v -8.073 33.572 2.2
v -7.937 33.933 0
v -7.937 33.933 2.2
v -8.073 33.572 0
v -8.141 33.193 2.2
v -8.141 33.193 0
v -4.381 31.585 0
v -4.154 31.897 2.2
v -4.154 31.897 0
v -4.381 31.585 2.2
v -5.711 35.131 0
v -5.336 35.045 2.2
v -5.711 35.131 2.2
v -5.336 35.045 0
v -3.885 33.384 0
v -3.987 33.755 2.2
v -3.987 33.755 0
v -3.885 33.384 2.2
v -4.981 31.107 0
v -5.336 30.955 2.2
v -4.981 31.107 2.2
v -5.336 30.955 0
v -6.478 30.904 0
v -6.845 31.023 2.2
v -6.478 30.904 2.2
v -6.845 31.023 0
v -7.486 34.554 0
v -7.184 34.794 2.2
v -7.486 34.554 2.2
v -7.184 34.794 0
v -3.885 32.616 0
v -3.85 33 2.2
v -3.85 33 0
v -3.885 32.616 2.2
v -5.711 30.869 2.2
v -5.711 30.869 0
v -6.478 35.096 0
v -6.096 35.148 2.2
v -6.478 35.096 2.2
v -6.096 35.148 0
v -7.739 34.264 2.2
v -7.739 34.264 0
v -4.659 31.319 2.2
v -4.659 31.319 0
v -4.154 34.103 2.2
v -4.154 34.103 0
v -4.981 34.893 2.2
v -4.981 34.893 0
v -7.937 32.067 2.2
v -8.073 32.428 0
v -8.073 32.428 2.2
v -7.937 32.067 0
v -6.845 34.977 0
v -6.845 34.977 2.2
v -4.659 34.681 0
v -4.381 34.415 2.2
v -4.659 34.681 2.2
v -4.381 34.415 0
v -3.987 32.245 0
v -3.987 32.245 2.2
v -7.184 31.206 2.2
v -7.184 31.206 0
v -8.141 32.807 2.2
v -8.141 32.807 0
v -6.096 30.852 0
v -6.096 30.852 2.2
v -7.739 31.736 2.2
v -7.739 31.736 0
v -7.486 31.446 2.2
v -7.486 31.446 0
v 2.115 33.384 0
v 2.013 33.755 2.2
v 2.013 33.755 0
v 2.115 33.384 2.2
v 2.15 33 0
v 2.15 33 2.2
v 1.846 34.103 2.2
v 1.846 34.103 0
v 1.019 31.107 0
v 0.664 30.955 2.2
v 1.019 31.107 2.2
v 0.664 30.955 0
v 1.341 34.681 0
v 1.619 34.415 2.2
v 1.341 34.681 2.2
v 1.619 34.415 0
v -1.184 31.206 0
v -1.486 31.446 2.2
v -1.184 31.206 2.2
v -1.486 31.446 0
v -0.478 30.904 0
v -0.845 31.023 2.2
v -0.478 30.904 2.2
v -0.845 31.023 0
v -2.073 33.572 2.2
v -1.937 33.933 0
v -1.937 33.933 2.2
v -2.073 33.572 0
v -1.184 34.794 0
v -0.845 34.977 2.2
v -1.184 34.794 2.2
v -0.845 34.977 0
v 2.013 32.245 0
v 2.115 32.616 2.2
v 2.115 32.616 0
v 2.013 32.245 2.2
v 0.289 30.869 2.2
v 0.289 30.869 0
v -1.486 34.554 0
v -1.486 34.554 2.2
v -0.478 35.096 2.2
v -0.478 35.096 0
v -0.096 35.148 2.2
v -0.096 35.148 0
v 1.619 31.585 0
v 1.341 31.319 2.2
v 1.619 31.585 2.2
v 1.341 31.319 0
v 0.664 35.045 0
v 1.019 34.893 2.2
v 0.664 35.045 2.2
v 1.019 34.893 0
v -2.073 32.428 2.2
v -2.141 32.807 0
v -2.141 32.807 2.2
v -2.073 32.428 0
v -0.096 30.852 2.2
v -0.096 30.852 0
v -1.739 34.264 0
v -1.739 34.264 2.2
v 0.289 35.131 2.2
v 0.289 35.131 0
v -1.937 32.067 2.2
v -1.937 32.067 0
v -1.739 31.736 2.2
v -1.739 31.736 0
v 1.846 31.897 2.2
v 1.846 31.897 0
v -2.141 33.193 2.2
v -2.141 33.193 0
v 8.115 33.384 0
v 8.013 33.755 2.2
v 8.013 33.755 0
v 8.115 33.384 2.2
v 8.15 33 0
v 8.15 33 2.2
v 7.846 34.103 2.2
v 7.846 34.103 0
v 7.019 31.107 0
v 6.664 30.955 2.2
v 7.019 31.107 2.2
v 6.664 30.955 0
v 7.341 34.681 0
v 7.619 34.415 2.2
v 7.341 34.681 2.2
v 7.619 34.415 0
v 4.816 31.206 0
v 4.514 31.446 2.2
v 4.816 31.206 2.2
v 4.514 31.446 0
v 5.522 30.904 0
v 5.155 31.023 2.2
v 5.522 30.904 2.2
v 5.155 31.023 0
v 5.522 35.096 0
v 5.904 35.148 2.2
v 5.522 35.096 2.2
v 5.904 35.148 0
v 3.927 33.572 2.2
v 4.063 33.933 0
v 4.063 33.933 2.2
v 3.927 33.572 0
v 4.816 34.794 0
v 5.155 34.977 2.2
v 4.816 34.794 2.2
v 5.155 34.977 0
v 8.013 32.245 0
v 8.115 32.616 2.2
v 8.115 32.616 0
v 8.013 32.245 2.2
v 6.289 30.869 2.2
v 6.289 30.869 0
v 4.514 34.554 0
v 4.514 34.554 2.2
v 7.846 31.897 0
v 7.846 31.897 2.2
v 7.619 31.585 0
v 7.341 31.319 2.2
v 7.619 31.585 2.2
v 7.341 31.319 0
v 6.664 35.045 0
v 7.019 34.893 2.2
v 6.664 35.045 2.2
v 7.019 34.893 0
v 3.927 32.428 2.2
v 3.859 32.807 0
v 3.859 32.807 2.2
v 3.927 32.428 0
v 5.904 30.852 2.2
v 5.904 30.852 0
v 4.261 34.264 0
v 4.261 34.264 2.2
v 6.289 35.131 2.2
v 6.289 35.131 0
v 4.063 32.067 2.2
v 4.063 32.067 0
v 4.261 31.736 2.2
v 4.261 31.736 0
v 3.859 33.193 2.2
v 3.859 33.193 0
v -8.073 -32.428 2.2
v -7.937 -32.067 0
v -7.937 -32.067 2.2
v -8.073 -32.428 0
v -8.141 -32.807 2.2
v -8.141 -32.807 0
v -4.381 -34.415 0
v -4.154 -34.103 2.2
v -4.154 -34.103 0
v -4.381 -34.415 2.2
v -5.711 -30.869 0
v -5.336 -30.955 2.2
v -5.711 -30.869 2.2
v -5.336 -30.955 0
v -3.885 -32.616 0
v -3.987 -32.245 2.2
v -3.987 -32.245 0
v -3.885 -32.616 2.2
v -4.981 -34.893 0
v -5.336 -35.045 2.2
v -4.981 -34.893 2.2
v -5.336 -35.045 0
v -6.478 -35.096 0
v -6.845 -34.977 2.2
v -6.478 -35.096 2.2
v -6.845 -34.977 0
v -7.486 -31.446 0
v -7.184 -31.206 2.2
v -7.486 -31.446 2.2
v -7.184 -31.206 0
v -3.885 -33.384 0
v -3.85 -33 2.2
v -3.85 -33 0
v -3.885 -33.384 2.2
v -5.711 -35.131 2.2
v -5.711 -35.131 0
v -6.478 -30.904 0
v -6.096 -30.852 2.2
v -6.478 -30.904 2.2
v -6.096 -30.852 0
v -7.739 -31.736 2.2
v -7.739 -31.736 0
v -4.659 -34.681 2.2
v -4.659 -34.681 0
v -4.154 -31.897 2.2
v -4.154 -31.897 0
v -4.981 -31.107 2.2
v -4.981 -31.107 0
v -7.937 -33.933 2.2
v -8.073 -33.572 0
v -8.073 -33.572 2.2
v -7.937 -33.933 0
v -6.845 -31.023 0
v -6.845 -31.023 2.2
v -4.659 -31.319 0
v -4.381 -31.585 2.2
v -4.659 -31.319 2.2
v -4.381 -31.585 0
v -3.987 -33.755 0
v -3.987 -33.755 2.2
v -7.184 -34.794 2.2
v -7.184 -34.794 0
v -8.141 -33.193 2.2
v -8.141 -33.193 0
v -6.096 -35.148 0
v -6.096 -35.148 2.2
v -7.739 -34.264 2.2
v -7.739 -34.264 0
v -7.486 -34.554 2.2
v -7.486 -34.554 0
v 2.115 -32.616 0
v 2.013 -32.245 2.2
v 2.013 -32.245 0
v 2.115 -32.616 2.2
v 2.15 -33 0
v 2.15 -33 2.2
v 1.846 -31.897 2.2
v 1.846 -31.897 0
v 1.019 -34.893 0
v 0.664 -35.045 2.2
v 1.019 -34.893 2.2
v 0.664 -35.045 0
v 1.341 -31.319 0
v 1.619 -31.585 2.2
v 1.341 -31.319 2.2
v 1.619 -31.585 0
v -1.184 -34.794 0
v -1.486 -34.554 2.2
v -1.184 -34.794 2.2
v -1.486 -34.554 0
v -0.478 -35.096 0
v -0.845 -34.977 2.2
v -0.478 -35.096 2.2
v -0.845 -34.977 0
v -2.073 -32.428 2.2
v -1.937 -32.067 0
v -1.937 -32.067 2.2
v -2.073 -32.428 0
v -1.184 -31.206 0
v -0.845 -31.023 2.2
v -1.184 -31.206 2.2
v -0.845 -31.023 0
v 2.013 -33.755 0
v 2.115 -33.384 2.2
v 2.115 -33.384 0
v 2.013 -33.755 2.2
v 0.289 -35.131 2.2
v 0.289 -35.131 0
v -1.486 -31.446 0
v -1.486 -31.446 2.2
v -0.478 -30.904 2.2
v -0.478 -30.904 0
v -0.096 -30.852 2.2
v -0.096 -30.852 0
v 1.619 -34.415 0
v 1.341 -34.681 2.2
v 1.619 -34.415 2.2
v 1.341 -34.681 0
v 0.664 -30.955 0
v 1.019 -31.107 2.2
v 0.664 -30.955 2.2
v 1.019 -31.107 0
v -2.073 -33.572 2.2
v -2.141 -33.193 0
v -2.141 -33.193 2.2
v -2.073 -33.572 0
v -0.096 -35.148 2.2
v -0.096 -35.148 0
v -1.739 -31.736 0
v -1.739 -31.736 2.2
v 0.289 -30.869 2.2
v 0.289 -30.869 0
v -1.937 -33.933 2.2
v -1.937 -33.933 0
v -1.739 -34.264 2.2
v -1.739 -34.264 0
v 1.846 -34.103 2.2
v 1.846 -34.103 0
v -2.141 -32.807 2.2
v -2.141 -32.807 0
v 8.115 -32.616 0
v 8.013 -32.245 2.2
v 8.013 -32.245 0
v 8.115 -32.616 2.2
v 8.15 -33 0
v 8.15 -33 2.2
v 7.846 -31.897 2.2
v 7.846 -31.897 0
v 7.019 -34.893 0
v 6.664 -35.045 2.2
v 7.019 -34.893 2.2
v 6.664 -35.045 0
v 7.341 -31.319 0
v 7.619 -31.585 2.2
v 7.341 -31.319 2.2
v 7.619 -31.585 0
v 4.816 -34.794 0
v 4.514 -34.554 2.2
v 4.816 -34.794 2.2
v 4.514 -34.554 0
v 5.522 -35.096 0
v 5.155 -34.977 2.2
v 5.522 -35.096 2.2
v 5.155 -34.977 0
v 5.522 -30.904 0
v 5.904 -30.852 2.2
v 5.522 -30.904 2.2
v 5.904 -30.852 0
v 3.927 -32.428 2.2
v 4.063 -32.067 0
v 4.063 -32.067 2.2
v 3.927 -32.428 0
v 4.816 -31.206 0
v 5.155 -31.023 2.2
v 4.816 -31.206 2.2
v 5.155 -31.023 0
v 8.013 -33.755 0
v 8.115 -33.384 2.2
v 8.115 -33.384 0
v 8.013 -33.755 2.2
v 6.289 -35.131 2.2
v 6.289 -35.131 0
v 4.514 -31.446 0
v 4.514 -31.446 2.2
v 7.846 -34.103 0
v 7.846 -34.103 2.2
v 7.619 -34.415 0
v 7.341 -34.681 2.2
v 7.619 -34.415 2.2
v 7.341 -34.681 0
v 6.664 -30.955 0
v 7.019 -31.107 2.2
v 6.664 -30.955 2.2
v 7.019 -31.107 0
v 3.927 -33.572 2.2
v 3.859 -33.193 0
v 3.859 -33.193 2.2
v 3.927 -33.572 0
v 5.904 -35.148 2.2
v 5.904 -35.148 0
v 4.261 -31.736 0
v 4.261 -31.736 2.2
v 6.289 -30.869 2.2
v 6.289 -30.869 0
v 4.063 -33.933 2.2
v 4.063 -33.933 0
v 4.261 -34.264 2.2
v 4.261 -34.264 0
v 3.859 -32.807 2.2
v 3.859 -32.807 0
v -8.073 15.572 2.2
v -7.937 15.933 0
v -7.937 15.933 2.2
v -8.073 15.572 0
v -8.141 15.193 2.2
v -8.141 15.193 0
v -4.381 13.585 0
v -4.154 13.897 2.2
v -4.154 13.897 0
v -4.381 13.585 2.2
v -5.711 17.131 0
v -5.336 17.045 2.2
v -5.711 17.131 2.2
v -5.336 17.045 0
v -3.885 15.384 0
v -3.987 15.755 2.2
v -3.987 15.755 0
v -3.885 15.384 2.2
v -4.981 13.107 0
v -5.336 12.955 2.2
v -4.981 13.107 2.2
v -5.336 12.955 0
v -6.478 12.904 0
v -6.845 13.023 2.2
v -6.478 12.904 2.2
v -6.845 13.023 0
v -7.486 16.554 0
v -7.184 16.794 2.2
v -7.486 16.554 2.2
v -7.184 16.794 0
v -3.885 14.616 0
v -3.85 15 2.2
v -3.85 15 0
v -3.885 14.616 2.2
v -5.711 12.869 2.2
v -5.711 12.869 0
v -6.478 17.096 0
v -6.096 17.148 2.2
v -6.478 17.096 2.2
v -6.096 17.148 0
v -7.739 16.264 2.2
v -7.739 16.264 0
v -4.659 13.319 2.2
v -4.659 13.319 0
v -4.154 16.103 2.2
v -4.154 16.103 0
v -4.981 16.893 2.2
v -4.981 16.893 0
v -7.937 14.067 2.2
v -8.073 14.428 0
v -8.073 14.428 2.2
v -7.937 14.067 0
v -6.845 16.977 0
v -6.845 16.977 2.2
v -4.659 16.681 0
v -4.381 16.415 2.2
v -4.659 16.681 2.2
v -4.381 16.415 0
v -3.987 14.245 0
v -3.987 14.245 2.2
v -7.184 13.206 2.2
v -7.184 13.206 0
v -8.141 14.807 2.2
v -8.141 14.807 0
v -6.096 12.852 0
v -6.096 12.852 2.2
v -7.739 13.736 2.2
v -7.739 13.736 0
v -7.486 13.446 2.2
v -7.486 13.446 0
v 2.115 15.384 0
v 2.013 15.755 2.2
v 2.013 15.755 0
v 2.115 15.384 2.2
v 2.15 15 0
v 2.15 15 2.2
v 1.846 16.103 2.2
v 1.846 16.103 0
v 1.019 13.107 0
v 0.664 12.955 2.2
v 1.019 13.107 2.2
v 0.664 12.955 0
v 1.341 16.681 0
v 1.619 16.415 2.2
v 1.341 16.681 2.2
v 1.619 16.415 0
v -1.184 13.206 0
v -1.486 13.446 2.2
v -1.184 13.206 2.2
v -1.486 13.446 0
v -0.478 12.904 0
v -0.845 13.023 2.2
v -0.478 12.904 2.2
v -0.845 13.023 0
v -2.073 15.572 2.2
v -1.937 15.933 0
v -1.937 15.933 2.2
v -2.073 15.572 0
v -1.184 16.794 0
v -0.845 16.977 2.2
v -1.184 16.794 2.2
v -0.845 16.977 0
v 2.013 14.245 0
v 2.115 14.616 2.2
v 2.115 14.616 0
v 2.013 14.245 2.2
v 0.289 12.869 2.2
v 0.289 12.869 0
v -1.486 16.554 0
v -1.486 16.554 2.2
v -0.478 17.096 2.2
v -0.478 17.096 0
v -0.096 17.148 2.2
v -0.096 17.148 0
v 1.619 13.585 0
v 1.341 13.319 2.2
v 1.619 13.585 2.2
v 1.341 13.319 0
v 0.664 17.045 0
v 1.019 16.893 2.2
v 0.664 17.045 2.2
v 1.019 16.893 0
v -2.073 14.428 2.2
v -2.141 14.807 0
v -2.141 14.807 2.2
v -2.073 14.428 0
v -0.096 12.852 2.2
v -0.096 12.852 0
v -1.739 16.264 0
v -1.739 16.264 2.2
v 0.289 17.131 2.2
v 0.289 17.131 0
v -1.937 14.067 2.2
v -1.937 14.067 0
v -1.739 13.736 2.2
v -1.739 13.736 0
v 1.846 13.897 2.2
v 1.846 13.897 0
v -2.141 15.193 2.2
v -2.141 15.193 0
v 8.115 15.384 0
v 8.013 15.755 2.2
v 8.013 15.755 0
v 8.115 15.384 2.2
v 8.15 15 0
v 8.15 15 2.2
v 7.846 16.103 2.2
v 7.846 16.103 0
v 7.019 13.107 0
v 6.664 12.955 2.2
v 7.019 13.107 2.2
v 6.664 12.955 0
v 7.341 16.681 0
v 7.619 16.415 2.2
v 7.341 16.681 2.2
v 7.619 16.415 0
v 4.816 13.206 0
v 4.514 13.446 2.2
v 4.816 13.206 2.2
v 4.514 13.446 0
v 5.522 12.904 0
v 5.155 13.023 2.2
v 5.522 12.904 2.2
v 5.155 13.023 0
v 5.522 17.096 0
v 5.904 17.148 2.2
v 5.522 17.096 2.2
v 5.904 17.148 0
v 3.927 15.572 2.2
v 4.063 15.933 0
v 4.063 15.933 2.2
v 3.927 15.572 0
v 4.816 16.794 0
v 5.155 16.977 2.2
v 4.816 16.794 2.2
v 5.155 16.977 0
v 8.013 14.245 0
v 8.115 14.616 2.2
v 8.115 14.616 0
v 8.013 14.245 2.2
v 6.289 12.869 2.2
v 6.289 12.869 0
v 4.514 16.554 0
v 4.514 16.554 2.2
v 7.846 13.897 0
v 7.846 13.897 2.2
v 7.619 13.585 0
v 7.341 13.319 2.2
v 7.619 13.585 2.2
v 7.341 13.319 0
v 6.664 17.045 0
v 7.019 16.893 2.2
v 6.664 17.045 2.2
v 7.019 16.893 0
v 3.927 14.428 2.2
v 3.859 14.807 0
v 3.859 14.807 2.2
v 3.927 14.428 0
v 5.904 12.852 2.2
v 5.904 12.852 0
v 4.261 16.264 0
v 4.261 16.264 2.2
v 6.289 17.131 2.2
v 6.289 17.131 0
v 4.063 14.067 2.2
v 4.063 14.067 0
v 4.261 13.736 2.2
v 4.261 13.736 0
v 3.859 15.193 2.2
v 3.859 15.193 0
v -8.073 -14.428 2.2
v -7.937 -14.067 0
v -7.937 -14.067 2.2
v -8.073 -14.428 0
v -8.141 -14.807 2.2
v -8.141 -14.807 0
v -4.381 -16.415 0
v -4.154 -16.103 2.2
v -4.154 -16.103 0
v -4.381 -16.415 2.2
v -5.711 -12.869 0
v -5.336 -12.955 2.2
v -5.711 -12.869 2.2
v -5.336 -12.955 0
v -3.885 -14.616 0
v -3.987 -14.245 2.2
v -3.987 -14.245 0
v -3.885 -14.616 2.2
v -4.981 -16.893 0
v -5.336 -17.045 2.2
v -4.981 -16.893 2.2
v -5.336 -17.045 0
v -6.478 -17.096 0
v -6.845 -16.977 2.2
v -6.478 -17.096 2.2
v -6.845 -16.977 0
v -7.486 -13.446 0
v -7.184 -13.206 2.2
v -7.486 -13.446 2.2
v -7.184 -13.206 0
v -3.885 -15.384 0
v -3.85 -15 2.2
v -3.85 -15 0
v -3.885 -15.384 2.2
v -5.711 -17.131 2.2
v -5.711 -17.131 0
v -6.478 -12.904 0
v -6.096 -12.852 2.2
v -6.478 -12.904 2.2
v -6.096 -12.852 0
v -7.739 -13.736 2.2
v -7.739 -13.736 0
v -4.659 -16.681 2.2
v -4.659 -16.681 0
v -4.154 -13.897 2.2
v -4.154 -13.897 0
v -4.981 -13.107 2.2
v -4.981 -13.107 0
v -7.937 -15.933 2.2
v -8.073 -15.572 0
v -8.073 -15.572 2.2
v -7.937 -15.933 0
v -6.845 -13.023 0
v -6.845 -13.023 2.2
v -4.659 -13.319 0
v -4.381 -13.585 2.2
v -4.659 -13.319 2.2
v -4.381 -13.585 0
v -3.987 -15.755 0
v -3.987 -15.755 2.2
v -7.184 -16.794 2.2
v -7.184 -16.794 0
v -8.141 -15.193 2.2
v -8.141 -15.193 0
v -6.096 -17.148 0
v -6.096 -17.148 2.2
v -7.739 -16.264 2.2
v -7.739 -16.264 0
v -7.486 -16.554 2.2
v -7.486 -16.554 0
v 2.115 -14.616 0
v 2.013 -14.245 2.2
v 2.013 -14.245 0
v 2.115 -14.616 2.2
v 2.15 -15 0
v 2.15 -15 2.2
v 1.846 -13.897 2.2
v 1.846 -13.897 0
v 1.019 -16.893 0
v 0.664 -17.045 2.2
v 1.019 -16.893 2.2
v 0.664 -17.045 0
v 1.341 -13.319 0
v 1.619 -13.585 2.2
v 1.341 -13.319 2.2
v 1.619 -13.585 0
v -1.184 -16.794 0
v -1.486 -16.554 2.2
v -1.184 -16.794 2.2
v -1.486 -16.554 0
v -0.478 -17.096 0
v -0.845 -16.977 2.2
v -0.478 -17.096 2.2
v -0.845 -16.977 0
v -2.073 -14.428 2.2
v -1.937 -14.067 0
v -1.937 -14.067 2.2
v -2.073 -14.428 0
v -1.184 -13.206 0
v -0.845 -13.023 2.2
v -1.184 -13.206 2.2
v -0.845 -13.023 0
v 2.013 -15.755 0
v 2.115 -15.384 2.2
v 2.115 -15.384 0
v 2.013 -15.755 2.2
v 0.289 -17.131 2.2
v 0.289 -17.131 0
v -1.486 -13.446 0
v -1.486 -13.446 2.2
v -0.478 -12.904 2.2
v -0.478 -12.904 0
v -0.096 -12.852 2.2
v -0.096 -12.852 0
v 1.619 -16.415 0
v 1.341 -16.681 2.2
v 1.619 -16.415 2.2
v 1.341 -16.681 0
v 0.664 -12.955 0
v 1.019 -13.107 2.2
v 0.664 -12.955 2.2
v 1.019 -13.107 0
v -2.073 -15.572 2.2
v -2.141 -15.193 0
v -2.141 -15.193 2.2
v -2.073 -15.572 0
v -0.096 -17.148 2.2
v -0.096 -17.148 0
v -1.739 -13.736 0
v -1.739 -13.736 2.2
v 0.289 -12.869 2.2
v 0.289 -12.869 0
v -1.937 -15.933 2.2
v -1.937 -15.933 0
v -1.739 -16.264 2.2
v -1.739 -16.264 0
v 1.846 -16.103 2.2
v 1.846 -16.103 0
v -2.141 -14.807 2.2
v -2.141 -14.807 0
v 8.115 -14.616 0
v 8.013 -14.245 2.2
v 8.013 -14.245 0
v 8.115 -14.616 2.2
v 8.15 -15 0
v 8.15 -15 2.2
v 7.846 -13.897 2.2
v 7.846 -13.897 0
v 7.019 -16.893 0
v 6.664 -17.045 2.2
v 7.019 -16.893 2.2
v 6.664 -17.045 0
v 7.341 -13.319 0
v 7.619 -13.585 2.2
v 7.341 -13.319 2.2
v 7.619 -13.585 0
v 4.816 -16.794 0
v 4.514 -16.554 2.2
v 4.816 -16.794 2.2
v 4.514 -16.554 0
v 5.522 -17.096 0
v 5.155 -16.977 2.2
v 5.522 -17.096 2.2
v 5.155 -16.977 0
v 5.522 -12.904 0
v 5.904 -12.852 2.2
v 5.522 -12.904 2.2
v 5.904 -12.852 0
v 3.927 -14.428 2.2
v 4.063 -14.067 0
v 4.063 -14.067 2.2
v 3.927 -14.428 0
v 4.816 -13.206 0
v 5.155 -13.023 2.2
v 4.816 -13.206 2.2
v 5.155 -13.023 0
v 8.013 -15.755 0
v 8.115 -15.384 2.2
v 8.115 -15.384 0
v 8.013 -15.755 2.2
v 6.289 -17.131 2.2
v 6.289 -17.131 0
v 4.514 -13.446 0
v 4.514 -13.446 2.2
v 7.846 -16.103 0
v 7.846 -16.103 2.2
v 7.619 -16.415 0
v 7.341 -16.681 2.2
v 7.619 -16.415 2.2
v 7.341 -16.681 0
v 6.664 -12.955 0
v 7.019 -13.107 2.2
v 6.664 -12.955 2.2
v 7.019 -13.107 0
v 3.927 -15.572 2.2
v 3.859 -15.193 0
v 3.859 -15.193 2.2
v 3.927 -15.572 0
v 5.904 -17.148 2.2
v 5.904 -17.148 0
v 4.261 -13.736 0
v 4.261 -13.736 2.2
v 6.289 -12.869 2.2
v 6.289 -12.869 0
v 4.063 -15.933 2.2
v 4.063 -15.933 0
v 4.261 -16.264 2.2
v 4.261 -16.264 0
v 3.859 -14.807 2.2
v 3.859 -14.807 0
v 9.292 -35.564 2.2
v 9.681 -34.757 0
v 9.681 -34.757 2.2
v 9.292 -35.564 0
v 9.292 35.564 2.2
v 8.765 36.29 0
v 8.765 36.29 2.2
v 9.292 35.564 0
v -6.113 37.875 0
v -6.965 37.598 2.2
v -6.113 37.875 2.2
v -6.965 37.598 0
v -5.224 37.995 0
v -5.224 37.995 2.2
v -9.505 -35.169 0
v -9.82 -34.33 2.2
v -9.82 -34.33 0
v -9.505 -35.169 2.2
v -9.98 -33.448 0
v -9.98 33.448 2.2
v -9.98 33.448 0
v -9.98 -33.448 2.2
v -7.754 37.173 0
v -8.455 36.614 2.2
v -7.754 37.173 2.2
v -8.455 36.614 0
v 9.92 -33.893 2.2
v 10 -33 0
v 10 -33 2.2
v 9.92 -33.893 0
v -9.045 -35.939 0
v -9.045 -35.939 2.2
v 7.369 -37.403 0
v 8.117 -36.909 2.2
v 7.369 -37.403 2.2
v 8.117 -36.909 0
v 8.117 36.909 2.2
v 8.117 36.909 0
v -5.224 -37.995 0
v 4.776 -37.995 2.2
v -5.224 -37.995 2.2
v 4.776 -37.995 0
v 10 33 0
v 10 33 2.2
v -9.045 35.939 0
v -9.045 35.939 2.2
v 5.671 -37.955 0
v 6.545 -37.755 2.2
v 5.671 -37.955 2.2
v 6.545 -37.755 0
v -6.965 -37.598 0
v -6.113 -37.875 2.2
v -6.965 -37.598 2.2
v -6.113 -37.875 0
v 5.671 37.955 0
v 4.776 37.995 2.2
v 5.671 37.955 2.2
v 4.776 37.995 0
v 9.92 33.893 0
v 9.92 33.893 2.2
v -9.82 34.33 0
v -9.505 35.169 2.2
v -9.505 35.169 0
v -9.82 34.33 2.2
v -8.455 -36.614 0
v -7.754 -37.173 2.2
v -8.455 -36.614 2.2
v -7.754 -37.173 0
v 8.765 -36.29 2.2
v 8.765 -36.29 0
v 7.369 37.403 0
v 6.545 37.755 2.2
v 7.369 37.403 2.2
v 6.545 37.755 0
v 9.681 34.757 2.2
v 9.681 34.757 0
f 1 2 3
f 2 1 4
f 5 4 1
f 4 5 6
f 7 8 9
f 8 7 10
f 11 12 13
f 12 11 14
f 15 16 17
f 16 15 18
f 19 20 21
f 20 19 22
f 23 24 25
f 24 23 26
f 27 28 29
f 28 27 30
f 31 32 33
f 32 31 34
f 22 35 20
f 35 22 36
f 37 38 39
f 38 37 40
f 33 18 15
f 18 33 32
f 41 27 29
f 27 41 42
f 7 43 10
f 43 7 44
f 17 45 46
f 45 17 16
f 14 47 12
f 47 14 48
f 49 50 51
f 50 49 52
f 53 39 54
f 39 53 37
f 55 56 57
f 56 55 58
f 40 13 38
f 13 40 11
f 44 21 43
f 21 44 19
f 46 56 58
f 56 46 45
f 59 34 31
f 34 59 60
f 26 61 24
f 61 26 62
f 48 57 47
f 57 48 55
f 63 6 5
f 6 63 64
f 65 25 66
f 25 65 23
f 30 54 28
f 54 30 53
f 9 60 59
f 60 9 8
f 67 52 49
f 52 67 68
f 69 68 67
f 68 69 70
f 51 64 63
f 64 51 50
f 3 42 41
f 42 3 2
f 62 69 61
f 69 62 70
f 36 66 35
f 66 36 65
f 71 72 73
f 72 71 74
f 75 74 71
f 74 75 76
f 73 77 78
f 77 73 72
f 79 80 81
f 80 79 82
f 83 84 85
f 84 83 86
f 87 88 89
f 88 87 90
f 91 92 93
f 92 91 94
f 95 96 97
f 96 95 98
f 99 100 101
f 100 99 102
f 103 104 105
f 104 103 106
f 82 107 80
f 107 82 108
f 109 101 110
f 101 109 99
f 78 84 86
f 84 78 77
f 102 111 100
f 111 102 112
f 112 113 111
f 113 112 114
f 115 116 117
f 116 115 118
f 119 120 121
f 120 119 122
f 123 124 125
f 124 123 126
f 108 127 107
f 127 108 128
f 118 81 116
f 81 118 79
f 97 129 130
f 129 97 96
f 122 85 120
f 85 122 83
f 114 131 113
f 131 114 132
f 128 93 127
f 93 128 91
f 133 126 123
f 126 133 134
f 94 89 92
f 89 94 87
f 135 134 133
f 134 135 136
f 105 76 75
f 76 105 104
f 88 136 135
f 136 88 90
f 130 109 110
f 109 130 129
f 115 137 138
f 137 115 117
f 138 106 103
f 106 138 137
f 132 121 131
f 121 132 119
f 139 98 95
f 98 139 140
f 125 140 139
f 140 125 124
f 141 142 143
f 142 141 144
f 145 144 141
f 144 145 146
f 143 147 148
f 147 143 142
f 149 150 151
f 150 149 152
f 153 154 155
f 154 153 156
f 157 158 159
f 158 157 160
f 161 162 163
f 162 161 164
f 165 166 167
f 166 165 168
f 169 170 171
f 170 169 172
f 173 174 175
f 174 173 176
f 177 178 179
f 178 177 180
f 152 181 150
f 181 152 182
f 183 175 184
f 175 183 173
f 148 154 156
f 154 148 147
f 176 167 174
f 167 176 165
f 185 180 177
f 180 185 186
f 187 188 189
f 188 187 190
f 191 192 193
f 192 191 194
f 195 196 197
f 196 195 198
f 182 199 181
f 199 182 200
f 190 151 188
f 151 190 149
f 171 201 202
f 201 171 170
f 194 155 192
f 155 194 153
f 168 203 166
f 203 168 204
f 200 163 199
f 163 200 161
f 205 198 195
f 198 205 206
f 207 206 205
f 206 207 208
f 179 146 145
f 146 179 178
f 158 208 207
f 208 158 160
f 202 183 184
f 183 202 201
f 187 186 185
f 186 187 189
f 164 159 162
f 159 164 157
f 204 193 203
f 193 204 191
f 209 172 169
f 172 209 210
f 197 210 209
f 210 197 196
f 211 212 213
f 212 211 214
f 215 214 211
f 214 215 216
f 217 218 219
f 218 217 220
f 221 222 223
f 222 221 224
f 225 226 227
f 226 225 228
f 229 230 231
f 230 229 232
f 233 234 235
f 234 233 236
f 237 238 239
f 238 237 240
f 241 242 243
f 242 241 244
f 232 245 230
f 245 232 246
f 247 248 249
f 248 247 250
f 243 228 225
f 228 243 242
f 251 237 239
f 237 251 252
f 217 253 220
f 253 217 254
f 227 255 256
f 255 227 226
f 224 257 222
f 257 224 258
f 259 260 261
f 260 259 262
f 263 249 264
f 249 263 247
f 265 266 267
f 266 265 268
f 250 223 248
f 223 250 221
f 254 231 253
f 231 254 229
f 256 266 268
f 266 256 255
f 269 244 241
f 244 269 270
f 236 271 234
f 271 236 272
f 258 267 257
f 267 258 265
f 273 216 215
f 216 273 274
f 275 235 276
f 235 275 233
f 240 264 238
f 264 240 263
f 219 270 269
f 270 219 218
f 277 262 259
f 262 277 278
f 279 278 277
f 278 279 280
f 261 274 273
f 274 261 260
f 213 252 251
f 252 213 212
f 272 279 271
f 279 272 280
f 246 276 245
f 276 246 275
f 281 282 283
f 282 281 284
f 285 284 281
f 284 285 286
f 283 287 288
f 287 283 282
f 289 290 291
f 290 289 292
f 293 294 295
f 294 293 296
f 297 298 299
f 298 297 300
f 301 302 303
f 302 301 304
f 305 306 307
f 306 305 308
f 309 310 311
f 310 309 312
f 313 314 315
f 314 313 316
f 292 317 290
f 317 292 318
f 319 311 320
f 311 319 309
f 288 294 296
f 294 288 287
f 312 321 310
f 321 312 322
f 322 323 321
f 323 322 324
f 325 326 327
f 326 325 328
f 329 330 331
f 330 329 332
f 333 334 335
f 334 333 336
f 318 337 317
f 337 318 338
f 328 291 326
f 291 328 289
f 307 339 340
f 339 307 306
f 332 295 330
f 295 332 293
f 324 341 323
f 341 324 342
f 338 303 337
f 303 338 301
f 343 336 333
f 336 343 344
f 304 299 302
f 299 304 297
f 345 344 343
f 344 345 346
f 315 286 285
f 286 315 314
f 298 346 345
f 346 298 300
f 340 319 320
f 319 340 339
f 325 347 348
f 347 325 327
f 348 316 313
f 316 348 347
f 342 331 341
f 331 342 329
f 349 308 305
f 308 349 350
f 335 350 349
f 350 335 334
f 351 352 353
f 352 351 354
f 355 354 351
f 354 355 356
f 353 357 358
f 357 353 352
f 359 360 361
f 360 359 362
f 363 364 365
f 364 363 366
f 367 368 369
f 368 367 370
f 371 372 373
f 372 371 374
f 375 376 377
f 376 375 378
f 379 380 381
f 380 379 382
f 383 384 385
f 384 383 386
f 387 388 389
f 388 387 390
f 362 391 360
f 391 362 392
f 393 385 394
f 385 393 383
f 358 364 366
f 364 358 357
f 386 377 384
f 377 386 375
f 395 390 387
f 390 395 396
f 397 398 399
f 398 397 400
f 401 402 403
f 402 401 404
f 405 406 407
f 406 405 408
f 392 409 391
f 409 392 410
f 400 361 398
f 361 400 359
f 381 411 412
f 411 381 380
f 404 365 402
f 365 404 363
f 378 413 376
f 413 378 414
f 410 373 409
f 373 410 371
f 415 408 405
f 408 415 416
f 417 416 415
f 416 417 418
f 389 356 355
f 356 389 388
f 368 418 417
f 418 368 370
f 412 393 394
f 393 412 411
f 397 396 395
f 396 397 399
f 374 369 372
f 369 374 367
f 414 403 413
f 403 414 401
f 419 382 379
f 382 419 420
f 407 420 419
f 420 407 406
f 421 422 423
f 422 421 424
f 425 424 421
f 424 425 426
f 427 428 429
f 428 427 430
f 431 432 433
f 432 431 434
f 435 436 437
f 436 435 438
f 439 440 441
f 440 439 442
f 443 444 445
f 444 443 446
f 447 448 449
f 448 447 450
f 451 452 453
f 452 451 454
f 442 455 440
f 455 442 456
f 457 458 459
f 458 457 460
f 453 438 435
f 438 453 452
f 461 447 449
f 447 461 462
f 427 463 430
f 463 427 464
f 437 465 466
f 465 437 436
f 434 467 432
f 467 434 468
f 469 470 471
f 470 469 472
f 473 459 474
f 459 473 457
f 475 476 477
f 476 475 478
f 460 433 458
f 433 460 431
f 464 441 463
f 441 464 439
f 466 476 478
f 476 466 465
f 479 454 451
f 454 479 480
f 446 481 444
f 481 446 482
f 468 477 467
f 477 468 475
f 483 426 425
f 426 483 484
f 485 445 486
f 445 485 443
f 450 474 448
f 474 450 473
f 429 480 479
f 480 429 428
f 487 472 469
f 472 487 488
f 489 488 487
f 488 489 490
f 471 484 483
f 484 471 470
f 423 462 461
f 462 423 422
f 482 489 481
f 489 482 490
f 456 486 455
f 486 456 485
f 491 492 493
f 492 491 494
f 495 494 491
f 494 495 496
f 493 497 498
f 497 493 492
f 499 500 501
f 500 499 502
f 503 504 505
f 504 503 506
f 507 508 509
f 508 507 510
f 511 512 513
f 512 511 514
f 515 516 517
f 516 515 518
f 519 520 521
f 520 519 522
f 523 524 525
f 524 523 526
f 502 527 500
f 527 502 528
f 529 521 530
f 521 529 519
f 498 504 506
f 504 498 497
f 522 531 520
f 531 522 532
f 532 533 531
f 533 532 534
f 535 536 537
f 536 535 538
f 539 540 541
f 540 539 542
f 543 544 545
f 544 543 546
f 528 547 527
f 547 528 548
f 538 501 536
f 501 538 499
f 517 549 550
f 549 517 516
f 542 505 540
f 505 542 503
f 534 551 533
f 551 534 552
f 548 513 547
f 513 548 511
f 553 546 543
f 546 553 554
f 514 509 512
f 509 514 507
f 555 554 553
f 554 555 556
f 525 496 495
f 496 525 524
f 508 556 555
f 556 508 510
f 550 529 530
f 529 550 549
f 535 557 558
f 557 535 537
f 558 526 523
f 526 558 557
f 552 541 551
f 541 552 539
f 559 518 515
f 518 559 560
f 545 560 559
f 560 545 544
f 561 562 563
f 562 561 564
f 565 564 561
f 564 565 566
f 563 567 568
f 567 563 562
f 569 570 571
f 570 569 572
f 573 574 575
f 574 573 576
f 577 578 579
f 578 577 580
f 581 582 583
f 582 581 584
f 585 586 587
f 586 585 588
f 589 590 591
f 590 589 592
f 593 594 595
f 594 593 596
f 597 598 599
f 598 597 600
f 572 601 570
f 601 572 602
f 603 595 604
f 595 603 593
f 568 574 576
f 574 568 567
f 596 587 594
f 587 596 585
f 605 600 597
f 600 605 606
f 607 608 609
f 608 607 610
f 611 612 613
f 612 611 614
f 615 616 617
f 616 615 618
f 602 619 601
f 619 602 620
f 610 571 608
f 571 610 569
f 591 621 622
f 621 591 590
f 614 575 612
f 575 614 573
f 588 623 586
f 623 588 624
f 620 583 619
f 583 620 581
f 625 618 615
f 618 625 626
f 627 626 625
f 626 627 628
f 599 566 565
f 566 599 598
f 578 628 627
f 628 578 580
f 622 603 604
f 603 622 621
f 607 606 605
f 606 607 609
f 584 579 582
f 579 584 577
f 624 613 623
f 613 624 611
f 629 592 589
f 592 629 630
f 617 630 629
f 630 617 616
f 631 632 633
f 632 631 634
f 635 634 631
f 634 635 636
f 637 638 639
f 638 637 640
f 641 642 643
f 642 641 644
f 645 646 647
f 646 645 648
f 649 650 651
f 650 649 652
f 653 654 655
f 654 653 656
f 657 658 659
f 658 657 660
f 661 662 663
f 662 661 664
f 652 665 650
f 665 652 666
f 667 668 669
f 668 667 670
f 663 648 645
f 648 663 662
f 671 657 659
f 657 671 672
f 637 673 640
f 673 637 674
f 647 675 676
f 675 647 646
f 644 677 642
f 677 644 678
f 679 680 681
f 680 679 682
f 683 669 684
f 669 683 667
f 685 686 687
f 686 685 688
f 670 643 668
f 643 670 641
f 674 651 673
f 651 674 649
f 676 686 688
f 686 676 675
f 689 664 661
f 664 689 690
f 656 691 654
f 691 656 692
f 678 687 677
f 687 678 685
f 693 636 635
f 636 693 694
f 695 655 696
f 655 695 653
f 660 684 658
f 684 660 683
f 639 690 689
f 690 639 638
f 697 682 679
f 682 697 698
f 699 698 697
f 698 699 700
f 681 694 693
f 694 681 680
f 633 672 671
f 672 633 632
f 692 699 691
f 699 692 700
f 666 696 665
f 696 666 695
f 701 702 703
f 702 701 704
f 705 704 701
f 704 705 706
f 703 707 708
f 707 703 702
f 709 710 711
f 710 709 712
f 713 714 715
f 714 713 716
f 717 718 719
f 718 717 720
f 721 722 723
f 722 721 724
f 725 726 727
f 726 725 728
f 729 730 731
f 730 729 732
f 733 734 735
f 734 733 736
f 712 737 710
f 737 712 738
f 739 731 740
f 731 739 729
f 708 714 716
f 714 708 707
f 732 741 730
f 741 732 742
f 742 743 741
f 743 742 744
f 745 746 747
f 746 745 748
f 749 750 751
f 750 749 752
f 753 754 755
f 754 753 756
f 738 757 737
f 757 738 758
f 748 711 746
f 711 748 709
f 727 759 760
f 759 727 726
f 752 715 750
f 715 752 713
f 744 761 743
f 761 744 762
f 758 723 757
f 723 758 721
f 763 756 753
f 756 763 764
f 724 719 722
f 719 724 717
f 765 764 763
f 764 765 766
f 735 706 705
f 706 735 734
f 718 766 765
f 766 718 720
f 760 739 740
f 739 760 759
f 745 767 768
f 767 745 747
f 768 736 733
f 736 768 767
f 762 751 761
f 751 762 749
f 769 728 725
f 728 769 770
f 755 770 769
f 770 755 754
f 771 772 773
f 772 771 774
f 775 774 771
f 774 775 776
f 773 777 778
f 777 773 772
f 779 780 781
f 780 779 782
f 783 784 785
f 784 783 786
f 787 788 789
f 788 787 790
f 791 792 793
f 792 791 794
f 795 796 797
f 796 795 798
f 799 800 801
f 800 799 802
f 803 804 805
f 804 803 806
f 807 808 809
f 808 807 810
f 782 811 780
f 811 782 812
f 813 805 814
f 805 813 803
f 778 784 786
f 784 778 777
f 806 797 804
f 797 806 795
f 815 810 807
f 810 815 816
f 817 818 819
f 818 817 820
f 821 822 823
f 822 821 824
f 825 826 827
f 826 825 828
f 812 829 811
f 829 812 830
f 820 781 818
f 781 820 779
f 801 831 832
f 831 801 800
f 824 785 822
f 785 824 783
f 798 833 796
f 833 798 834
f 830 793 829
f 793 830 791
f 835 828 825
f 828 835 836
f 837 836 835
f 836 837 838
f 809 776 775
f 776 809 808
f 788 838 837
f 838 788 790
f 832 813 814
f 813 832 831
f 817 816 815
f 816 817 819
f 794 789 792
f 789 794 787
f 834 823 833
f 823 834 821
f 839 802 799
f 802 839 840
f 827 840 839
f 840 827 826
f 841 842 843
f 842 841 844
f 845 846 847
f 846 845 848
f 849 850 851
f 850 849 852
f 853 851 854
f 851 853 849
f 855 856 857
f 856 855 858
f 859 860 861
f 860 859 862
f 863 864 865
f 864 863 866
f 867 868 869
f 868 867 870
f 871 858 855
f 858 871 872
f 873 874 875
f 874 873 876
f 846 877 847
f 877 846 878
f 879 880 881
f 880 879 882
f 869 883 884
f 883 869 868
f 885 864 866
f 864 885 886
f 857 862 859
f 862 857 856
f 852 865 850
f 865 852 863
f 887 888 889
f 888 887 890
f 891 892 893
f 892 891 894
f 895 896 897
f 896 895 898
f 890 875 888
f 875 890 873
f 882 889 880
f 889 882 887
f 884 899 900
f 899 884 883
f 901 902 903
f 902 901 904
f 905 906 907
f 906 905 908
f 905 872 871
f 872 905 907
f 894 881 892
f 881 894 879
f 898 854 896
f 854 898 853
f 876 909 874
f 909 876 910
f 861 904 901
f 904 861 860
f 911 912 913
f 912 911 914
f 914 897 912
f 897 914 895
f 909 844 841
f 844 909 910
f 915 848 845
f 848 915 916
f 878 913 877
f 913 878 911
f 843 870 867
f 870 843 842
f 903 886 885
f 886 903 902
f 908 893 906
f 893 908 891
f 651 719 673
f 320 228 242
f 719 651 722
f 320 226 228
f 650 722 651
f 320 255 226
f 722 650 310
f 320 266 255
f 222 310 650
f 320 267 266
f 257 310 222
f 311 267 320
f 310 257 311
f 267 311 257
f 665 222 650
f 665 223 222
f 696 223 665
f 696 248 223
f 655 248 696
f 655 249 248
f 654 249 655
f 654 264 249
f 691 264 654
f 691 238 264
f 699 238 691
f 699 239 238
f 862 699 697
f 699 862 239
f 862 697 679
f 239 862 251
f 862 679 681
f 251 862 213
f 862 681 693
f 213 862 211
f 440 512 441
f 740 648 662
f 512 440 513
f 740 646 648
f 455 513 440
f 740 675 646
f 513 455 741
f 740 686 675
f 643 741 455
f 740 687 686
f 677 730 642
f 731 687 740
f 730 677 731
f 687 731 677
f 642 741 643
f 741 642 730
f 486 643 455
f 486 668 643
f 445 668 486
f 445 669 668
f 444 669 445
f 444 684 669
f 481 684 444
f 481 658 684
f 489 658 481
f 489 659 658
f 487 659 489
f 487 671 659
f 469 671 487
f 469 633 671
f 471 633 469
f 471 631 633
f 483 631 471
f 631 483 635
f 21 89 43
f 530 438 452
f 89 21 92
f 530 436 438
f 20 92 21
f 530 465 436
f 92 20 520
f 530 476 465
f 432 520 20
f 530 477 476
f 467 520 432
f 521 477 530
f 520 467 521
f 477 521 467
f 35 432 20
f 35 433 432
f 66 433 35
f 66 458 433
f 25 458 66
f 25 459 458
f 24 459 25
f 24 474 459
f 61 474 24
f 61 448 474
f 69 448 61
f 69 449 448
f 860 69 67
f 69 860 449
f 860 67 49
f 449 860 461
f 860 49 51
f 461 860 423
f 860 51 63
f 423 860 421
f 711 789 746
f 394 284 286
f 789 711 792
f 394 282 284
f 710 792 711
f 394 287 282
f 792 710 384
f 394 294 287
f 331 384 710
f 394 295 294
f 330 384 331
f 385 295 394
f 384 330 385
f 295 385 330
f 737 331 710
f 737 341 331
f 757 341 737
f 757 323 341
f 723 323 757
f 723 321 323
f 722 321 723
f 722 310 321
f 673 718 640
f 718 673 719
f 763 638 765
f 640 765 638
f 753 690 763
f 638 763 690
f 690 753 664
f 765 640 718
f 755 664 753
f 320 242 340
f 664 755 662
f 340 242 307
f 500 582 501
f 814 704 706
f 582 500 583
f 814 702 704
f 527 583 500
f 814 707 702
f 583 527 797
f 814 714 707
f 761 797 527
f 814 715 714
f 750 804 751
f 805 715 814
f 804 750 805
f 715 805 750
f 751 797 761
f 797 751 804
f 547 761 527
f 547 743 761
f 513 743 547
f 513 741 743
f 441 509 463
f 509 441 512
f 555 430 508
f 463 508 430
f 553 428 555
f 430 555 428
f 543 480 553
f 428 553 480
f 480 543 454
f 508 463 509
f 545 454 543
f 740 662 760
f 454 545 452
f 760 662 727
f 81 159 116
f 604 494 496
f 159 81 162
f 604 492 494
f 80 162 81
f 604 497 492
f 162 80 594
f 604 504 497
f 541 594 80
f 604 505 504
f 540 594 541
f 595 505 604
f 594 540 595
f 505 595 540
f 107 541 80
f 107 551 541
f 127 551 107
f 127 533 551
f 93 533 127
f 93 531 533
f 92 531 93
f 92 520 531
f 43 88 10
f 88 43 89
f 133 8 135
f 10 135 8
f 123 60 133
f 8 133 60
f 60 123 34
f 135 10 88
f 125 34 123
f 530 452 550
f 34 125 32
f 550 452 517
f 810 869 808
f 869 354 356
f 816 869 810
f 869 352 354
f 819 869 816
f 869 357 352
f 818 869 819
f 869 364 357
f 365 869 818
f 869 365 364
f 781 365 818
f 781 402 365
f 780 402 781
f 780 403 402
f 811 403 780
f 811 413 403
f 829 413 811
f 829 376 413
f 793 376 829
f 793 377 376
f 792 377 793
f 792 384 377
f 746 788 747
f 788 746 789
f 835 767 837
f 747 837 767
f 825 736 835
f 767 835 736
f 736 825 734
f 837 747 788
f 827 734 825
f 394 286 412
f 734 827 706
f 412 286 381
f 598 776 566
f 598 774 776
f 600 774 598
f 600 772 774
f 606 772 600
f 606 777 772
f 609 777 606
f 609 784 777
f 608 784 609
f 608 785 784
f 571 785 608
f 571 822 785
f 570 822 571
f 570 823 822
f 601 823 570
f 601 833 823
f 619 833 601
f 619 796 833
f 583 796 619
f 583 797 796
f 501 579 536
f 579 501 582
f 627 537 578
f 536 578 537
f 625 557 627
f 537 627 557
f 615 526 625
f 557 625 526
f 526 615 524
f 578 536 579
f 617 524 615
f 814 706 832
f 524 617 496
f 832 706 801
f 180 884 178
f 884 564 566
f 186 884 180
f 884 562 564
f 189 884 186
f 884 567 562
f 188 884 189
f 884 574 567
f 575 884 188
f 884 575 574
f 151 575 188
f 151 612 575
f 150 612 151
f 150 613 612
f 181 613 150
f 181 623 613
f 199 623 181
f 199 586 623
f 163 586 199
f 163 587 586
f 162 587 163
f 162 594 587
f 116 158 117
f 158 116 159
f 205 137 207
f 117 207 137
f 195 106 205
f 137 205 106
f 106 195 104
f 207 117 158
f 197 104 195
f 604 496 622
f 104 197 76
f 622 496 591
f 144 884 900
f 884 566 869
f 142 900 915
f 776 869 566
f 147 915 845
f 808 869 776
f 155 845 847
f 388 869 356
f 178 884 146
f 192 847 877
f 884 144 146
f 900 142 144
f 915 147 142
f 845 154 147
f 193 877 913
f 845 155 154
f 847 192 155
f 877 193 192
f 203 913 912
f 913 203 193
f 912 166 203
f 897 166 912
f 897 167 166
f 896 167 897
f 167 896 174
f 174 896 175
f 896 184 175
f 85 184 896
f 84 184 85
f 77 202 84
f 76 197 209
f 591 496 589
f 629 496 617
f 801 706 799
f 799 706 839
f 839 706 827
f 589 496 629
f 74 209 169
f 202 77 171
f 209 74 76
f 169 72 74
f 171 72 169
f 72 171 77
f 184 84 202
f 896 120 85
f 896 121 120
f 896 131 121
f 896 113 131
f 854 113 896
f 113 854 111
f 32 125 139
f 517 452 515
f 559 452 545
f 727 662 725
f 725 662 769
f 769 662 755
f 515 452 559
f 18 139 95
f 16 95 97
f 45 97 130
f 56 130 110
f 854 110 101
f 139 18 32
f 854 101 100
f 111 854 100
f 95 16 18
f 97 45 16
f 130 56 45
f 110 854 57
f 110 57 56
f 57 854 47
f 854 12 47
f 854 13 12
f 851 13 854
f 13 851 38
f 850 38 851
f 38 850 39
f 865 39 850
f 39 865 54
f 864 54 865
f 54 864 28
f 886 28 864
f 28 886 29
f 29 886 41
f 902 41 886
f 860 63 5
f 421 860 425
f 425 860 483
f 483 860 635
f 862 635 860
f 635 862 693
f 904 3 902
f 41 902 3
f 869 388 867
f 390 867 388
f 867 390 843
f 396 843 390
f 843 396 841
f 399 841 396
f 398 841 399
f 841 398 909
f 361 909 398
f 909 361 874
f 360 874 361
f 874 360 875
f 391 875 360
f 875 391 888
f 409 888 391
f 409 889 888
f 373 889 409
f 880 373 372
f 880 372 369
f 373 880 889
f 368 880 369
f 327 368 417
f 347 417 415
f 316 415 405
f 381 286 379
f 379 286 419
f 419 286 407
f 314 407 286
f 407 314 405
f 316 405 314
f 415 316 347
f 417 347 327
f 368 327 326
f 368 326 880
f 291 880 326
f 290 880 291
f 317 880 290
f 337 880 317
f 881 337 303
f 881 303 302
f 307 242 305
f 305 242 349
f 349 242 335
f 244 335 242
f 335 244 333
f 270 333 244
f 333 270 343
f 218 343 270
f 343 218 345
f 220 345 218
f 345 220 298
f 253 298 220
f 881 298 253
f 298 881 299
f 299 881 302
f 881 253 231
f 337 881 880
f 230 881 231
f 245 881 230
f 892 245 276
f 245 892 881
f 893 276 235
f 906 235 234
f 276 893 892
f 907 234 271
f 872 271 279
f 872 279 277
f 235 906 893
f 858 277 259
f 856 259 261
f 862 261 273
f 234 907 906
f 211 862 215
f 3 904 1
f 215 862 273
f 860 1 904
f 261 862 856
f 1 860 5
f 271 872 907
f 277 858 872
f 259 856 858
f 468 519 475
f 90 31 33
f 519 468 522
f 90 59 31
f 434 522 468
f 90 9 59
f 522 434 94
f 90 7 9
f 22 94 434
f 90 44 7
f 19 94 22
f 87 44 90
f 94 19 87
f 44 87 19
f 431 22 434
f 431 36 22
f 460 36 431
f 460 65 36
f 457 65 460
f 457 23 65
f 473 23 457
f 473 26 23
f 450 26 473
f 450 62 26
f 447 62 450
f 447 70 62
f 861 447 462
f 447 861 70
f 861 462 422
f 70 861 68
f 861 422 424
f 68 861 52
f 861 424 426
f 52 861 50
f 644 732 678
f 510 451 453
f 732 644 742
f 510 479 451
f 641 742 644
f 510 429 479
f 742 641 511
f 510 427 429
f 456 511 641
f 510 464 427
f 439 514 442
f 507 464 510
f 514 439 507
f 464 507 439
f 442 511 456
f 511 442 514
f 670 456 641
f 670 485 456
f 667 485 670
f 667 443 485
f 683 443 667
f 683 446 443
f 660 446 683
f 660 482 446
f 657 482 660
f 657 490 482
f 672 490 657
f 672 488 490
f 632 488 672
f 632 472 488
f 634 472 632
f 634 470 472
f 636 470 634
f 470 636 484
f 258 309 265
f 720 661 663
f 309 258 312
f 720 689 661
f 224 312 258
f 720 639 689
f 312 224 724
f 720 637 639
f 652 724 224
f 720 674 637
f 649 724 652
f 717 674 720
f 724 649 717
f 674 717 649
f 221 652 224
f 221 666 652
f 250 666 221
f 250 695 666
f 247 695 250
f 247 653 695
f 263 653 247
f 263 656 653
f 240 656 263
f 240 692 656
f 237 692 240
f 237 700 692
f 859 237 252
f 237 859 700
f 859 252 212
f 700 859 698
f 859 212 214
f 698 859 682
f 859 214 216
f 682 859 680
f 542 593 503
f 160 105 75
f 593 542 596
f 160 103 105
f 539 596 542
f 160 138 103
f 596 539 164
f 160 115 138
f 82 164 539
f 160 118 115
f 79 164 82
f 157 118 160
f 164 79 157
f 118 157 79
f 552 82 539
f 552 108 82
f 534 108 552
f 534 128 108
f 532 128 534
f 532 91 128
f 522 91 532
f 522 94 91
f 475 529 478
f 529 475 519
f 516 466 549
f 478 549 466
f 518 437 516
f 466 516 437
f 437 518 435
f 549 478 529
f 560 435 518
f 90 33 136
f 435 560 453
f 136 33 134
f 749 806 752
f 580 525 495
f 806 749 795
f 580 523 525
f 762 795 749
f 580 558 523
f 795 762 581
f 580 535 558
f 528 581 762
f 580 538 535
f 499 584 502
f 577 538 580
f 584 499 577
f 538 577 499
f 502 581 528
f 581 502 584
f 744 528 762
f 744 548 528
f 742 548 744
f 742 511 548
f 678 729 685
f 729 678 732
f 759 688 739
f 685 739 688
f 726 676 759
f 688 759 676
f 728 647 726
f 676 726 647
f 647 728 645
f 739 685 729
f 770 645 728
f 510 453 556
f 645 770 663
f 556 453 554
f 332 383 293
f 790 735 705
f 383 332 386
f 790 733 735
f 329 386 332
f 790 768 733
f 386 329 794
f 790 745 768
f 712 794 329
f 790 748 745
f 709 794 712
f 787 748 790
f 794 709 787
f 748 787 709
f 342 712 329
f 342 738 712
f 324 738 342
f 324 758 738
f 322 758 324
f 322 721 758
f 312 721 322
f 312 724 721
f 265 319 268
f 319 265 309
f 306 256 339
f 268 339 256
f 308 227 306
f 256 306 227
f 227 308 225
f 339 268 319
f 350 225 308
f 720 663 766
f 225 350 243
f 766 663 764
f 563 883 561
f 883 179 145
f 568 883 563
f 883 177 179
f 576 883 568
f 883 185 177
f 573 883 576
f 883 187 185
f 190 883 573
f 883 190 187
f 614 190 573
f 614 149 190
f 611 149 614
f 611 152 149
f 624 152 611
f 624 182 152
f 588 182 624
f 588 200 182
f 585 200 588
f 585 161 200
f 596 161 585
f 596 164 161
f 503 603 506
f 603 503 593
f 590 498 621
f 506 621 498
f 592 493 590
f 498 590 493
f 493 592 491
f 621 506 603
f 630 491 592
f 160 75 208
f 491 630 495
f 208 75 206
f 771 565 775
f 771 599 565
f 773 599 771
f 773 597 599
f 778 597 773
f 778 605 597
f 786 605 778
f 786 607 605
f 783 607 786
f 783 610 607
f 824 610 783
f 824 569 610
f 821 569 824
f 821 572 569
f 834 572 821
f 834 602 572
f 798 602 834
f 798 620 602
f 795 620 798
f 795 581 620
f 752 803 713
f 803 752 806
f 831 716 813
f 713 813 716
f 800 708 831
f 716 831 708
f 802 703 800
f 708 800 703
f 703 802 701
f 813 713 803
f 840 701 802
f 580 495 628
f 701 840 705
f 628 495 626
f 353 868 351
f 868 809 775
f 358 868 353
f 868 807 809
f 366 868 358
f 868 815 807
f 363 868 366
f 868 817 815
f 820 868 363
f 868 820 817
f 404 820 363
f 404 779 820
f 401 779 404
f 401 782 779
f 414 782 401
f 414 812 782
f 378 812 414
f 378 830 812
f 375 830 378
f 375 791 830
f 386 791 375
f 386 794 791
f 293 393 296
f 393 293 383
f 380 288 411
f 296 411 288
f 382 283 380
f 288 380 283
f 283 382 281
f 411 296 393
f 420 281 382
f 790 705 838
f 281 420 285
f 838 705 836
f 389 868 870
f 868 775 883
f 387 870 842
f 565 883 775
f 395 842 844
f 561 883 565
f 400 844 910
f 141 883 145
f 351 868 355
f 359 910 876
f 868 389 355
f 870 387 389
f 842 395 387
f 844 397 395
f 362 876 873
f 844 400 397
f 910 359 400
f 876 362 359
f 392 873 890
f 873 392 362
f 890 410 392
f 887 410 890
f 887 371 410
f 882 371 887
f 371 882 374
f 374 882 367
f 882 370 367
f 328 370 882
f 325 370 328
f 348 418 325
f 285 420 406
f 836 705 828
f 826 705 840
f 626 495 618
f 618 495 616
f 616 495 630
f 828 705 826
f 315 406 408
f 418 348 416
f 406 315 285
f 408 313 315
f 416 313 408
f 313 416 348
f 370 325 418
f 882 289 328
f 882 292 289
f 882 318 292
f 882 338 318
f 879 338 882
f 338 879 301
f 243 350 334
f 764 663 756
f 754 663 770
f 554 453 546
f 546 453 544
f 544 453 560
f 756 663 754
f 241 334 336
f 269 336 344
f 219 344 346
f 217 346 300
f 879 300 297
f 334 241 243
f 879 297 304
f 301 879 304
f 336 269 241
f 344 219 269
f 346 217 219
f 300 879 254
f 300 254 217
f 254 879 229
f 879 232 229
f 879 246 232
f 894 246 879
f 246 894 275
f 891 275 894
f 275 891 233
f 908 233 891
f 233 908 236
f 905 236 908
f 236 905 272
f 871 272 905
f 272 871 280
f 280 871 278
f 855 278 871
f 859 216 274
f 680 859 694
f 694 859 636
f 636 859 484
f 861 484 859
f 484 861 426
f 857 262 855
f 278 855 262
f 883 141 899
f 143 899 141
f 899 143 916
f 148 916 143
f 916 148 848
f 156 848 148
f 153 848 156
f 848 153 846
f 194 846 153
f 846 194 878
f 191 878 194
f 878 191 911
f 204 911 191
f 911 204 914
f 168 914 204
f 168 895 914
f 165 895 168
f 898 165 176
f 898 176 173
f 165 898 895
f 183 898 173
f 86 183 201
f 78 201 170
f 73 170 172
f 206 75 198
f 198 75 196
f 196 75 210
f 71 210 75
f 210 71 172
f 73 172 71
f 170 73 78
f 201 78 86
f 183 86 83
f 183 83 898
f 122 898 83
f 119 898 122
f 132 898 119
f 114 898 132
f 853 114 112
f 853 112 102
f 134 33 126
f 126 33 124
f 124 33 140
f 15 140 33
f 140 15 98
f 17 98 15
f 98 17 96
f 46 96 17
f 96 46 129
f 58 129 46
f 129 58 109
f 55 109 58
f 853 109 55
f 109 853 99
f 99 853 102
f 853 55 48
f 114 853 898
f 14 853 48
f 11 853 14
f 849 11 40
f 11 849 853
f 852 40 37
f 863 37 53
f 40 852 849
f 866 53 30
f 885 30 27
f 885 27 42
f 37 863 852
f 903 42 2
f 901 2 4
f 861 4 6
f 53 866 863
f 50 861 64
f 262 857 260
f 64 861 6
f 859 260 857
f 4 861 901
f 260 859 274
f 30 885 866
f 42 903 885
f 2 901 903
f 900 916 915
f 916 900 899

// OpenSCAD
// file: ../../util/rounded.scad
// Do a rounded cube
module rounded(x=10, y=10, z=10, r=3, center=false) {
  if (center) {
    translate([-(x/2),-(y/2),0])
      rounded(x, y, z, r);
  } else {
    translate([r,r,0])
    minkowski() {
      cube([x-2*r,y-2*r,z/2]);
      cylinder(h=z/2, r=r);
    }
  }
}
// file: ../../models/ollo.scad
// Diameter of plastic ollo holes
OlloHoles = 4.3;

// Width of Ollo "real" plastic
OlloWidth = 3;

// Distance between two ollo holes
OlloSpacing = 6;

// Do an Ollo hole on the part
module olloHole(depth=2.2)
{
    translate([0,0,-0.1])
      cylinder(depth+0.2, OlloHoles/2, OlloHoles/2);
}

// Do 3 ollo holes
module threeOllo(depth=2.2)
{
  for (xy=[[-OlloSpacing,0],[0,0],[OlloSpacing,0]]) {
    translate([xy[0], xy[1], 0])
    olloHole(depth);
  }
}

// Do a servo arm holes
module servoArm(depth=2.2)
{
    threeOllo(depth);
    rotate([0,0,90])
      threeOllo(depth);
}
// file: ../../parts/leg.scad
use <../models/ollo.scad>;
use <../util/rounded.scad>;

module leg(sizeA=60, sizeB=20, sizeC=20, sizeBottom=10,
        sizeTop=15, motorsPerLeg=3, fixationAngle=0, width=2.2, print=false)
{
    xOffset = (motorsPerLeg == 2) ? -10 : 0;
    spacing = (motorsPerLeg == 2) ? 24 : 30;

    module legSide()
    {
        difference() {
            union() {
                translate([0,0,sizeA/2])
                    rotate([0,90,0]) {
                        cube([sizeA, 20, width], center=true);
                        if (motorsPerLeg == 2) {
                            translate([15-sizeA/2, 10, -width/2])
                                rotate([0,0,+fixationAngle])
                                rounded(25,10,width, center=true);
                        }
                    }
            }
            translate([-width, 0, sizeA-15]) {
                rotate([90,0,90]) {
                    if (motorsPerLeg == 3) {
                        servoArm(2*width);
                    }
                }
                if (motorsPerLeg == 2) {
                    translate([0,10,0])
                        rotate([90,90-fixationAngle,90])
                        threeOllo(2*width);
                }
            }
        }
        translate([-width/2,0,sizeA]) {
            rotate([90,0,90])
                linear_extrude(width)
                polygon([[-10,0],[-1,sizeTop],[1,sizeTop],[10,0]]);
        }
    }

    module biais() {
        Dx = (spacing-sizeBottom)/2;
        Dy = sizeC;
        Dl = sqrt(pow(Dx,2)+pow(Dy,2));

        translate([-(spacing/2)-width,-10,-(sizeB+width/2)])
            rotate([0,atan2(Dy,Dx),0])
            cube([Dl,20,width]);
    }

    if (print) {
        translate([0,0,10-xOffset])
            rotate([90,0,0])
            leg(sizeA, sizeB, sizeC, sizeBottom,
                    sizeTop, motorsPerLeg, fixationAngle, width, false);
    } else {
        translate([0,xOffset,-sizeA+15]) {
            cube([spacing+width*2, 20, width], center=true);

            translate([spacing/2+width/2,0,0])
                legSide();
            translate([-(spacing/2+width/2),0,0])
                legSide();

            translate([0,0,-sizeB])
                cube([spacing+width*2, 20, width], center=true);
            translate([spacing/2+width/2,0,-sizeB/2])
                cube([width,20,sizeB], center=true);
            translate([-(spacing/2+width/2),0,-sizeB/2])
                cube([width,20,sizeB], center=true);

            translate([0,0,-(sizeB+sizeC)])
                cube([sizeBottom+width*2, 20, width], center=true);

            biais();
            mirror([1,0,0]) {
                biais();
            }
        }
    }
}

leg();
// file: ../../parts/side.scad
include <../models/ollo.scad>;
use <../util/rounded.scad>;

module side(size=40, holesToBorder=5, width=2.2, print=false) {
    if (print) {
        translate([0,-size+holesToBorder,0])
            side(size,holesToBorder,width,false);
    } else {
        translate([0,size-holesToBorder,0]) {
            difference() {
                rounded(20, size*2, width, 5, true);
                for (y=[size-holesToBorder,	 -size+holesToBorder,
                        size-holesToBorder-3*OlloSpacing, -size+holesToBorder+3*OlloSpacing]) {
                    translate([0, y, 0])
                        threeOllo();
                }
            }
        }
    }
}

side();
// file: ../../parts/u.scad
use <../models/ollo.scad>;

module u(height=15, radius=8, width=2.2, screwsSpacing=10, screwsDiameter=2.6, screws=true, print=false) {
    module Ubranch() {
        union() {  
            cylinder(width, 10, 10);
            translate([-10,0,0])
                cube([20, height, width]);
        }
    }

    module USide() {
        difference() {
            union() {
                Ubranch();
                translate([-10,height+radius-width,radius])
                    cube([20,width,15-(radius-width)]);
                translate([-10,height,radius]) {
                    rotate([0,90,0]) {
                        difference() {
                            cylinder(20,radius,radius);
                            translate([0,0,-1])
                                cylinder(22,radius-width,radius-width);
                            translate([-10+radius-width,-10,-1])
                                cube([10,10,22]);
                            translate([-10,-20+radius-width,-1])
                                cube([10,20.01,22]);
                        }
                    }
                }
            }
            servoArm(depth=6);
        }
    }

    module UScrews() {
        for (x=[-screwsSpacing/2,screwsSpacing/2]) {
            for (y=[-screwsSpacing/2,screwsSpacing/2]) {
                rotate([270,0,0])
                    translate([x,y,0])
                    cylinder(d=screwsDiameter, h=100);
            }
        }
    }

    if (print) {
        translate([0,0,10])
            rotate([0,90,0])
            u(height,radius,width,screwsSpacing,screwsDiameter,screws,false);
    } else {
        difference() {
            translate([0,0,-15-width]) {
                USide();
                mirror([0,0,1]) translate([0,0,-2*width-30])  
                    USide();
            }
            if (screws) {
                UScrews();
            }
        }
    }
}

u();
// file: ../../parts/body.scad
use <../models/ollo.scad>;
use <../util/rounded.scad>;

module body(size=20, legs=4, width=2.2) {
    module bodyPart() {
        difference() {
            translate([-10,0,0])
                rounded(20, size, width, 5);
        }
    }

    module bodyHoles() {
        translate([0, size-5, 0]) {
            threeOllo();
        }
    }

    difference() {
        union() {
            cylinder(d=size*1.8, h=width);
            for (leg=[0:legs]) {
                rotate([0,0,360*leg/legs])
                    bodyPart();
            }
        }
        for (leg=[0:legs]) {
            rotate([0,0,360*leg/legs])
                bodyHoles();
        }
    }			
}

body(size=30);
// file: ../parts.scad
include <config.scad>;
use <../parts/body.scad>;
use <../parts/u.scad>;
use <../parts/side.scad>;
use <../parts/leg.scad>;

module spidey_colorize() {
    color(PartsColor)
        children();
}

module spidey_u(print=false) {
    spidey_colorize()
        u(UHeight, URadius, Width, UScrewsSpacing, UScrewsDiameter, print=print);
}

module spidey_leg(print=false) {
    spidey_colorize()
        leg(LegSizeA, LegSizeB, LegSizeC, LegSizeBottom,
                LegSizeTop, MotorsPerLeg, L3Angle, Width, print=print);
}

module spidey_body(print=false) {
    spidey_colorize()
        body(BodySize, Legs, Width, print=print);
}

module spidey_side(print=false) {
    spidey_colorize()
        side(SideSize, SideHolesToBorder, Width, print=print);
}
// file: ../config.scad
// Number of legs
Legs = 4;

// Size of the body
BodySize = 20;

// Number of motors per leg (2 or 3)
MotorsPerLeg = 3;

// Static L3 angle (used only if 2 motors per leg)
L3Angle = -5;

// Color of the parts, for rendering
PartsColor = [0.8, 0.8, 0.8];

// Width of parts (2.2 is good for Ollo rivets)
Width = 2.2;

// Sizes of the parts of the leg
// Ratio of leg parts
LegSize = 100;
LegSizeA = (0.60)*LegSize;
LegSizeB = (0.20)*LegSize;
LegSizeC = (0.20)*LegSize;

// Width of the bottom part of the leg
LegSizeBottom = 10;

// Size of the "top" part of the legs, in mm
LegSizeTop = 30;

// Motor dimensions
MotorWidth = 24;
MotorHeight = 36;
MotorDepth = 24;
MotorArmOffset = 9;

// U dimensions
UHeight = 14;
URadius = 8;
UWidth = 30+Width/2;
UTotalHeight = UHeight+URadius;
UScrewsSpacing = 10;
UScrewsDiameter= 2.6;

// Side dimensions
SideSize = 38;
SideHolesToBorder = 5;

// Defining the resolution
$fn=35;
// main file
include <../config.scad>;
use <../parts.scad>;

spidey_side(print=true);
